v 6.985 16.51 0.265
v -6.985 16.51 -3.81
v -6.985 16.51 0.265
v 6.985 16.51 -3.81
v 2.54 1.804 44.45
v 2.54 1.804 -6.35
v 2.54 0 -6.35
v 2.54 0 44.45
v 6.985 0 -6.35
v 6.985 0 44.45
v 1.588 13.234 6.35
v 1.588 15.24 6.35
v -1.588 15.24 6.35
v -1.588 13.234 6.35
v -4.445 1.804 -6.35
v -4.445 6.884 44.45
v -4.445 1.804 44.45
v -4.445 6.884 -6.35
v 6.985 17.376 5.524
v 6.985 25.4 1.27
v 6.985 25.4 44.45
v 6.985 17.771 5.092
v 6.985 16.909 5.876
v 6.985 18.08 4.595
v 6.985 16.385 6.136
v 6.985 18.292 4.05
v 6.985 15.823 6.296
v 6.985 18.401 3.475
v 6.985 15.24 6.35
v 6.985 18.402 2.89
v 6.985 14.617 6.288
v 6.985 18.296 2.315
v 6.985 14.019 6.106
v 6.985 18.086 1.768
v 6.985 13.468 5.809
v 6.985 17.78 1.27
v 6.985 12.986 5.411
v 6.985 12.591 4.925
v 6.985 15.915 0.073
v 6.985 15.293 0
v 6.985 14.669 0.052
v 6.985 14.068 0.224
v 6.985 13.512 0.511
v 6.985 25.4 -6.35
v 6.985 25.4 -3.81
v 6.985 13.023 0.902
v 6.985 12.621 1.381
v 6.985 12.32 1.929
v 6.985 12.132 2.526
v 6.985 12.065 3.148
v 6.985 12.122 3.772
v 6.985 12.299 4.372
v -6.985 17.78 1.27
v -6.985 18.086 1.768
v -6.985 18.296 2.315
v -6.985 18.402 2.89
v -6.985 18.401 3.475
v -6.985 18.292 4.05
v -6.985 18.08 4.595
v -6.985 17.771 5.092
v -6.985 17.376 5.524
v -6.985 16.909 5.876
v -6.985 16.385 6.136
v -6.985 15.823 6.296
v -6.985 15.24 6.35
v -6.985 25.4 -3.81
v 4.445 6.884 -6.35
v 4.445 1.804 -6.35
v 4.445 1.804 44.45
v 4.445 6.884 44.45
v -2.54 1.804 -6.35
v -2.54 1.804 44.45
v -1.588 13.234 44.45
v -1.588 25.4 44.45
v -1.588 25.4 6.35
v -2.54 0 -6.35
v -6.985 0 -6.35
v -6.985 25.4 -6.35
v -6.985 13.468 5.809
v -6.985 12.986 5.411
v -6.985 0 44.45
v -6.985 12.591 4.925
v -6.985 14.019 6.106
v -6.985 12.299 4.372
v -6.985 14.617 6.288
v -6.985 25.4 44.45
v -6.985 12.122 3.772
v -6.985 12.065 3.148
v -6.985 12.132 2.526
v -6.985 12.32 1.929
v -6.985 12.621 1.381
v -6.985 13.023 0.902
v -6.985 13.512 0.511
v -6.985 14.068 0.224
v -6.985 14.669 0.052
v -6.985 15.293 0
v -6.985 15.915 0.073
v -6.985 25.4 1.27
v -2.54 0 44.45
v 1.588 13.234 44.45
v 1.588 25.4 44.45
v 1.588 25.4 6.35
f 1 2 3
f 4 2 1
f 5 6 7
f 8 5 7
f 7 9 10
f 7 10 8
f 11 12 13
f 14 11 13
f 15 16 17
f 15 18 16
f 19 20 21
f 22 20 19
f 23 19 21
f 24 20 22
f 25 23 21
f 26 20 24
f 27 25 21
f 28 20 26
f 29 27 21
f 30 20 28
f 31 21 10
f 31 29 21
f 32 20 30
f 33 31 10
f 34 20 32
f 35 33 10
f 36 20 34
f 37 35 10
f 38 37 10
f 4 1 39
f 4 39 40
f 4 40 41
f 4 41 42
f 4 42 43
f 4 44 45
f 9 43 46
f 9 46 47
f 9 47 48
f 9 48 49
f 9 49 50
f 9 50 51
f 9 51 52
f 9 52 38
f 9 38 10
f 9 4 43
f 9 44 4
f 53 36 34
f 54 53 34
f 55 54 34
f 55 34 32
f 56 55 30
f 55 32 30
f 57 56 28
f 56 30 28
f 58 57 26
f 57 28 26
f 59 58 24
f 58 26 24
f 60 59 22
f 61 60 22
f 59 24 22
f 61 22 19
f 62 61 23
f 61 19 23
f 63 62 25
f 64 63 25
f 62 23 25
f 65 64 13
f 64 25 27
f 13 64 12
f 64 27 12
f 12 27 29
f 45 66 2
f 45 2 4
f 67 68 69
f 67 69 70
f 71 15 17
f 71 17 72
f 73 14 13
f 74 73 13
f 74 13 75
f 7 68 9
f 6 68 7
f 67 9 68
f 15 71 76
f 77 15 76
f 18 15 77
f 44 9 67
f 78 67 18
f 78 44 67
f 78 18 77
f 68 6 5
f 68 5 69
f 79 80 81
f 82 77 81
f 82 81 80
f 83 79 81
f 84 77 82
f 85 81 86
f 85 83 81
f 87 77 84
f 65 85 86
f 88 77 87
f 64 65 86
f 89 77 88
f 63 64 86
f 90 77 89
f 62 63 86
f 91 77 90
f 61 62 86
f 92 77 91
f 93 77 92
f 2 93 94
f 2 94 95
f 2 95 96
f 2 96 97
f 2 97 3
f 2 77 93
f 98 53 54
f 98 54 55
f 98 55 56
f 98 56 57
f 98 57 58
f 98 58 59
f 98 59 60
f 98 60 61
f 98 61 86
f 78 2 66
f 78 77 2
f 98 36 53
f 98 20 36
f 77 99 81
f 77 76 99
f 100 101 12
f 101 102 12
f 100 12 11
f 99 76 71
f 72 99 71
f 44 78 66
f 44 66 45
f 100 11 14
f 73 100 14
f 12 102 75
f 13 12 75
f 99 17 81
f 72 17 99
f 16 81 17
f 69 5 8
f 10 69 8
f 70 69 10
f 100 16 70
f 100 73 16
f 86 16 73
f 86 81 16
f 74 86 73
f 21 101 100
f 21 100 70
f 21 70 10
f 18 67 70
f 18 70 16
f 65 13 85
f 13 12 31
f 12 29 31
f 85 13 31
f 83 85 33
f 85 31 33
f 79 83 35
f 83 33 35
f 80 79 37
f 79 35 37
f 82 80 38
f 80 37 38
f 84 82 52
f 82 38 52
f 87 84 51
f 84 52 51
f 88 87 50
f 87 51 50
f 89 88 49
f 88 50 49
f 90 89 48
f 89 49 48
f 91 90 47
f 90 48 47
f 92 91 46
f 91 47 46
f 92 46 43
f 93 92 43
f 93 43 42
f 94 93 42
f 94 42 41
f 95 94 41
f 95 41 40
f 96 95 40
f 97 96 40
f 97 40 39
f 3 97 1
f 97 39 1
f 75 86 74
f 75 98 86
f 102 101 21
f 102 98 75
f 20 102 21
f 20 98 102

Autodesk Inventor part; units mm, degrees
ref_plane "YZ Plane" through (0, 0, 0) normal (1, 0, 0) x (0, 1, 0)
ref_plane "XZ Plane" through (0, 0, 0) normal (0, 1, 0) x (-1, 0, 0)
ref_plane "XY Plane" through (0, 0, 0) normal (0, 0, 1) x (1, 0, 0)
sketch "Sketch1" plane through (0, 0, 0) normal (0, 0, 1) x (1, 0, 0)
  line L0 (2.54, -4.344) -> (-2.54, -4.344)
  line L1 (-2.54, -4.344) -> (-2.54, 4.344)
  line L2 (-2.54, 4.344) -> (2.54, 4.344)
  line L3 (2.54, 4.344) -> (2.54, -4.344)
  line L4 (2.54, -4.344) -> (-2.54, 4.344) construction
  line L5 (-2.54, -4.344) -> (2.54, 4.344) construction
  line L6 (4.445, 6.884) -> (-4.445, 6.884)
  line L7 (-4.445, 6.884) -> (-4.445, 1.804)
  line L8 (-4.445, 1.804) -> (4.445, 1.804)
  line L9 (4.445, 1.804) -> (4.445, 6.884)
  line L10 (4.445, 6.884) -> (-4.445, 1.804) construction
  line L11 (-4.445, 6.884) -> (4.445, 1.804) construction
  line L12 (3.8177, 1.5502) -> (-3.8177, 7.1379) construction
  line L13 (-4.445, -1.73) -> (4.445, 10.418) construction
  line L14 (6.985, 0) -> (-6.985, 0)
  line L15 (-6.985, 0) -> (-6.985, 25.4)
  line L16 (-6.985, 25.4) -> (6.985, 25.4)
  line L17 (6.985, 25.4) -> (6.985, 0)
  line L18 (6.985, 0) -> (-6.985, 25.4) construction
  line L19 (-6.985, 0) -> (6.985, 25.4) construction
  line L20 (0, 25.4) -> (0, 0) construction
  line L21 (-1.5875, 25.4) -> (1.5875, 25.4)
  line L22 (1.5875, 25.4) -> (1.5875, 13.234)
  line L23 (1.5875, 13.234) -> (-1.5875, 13.234)
  line L24 (-1.5875, 13.234) -> (-1.5875, 25.4)
  point P0 (0, 4.344)
  point P1 (0, 12.7)
  point P2 (2.54, 1.804)
  point P3 (2.54, 0)
  point P4 (-2.54, 0)
  point P5 (-2.54, 1.804)
  dimension "d0" = 5.08
  dimension "d1" = 8.89
  dimension "d2" = 5.08
  dimension "d3" = 8.89
  dimension "d4" = 8.89
  dimension "d5" = 13.97
  dimension "d6" = 25.4
  dimension "d7" = 0
  dimension "d8" = 3.175
  dimension "d9" = 1.5875
  dimension "d27" = 6.35
extrude "Extrusion1" add sketch "Sketch1" along normal blind 44.45 contours L3 L8 L9 L6 L7 L1 L14 L15 L16 L24 L23 L22 L17
sketch "Sketch2" plane through (0, 0, 0) normal (0, 0, -1) x (-1, 0, 0)
  line L0 (4.445, 6.884) -> (-4.445, 6.884) projected
  line L1 (4.445, 1.804) -> (4.445, 6.884) projected
  line L2 (2.54, 1.804) -> (4.445, 1.804) projected
  line L3 (2.54, 0) -> (2.54, 1.804) projected
  line L4 (6.985, 0) -> (2.54, 0) projected
  line L5 (6.985, 25.4) -> (6.985, 0) projected
  line L6 (1.5875, 25.4) -> (6.985, 25.4) projected
  line L7 (1.5875, 13.234) -> (1.5875, 25.4) projected
  line L8 (-1.5875, 13.234) -> (1.5875, 13.234) projected
  line L9 (-1.5875, 25.4) -> (-1.5875, 13.234) projected
  line L10 (-6.985, 25.4) -> (-1.5875, 25.4) projected
  line L11 (-6.985, 0) -> (-6.985, 25.4) projected
  line L12 (-2.54, 0) -> (-6.985, 0) projected
  line L13 (-2.54, 1.804) -> (-2.54, 0) projected
  line L14 (-4.445, 1.804) -> (-2.54, 1.804) projected
  line L15 (-4.445, 6.884) -> (-4.445, 1.804) projected
  line L16 (-1.5875, 25.4) -> (1.5875, 25.4)
  line L17 (1.5875, 25.4) -> (1.5875, 13.234)
  line L18 (1.5875, 13.234) -> (-1.5875, 13.234)
  line L19 (-1.5875, 13.234) -> (-1.5875, 25.4)
  point P0 (0, 0)
  point P1 (1.5875, 25.4)
extrude "Extrusion2" add sketch "Sketch2" against normal blind 6.35 contours L7 L8 L9 L16
sketch "Sketch3" plane through (6.985, 0, 0) normal (1, 0, 0) x (0, 0, -1)
  line L0 (0, 0) -> (0, 25.4) projected
  line L1 (0, 25.4) -> (-44.45, 25.4) projected
  line L2 (-44.45, 0) -> (-44.45, 25.4) projected
  line L3 (0, 0) -> (-44.45, 0) projected
  line L4 (-6.35, 25.4) -> (-6.35, 13.234) projected
  circle A0 centre (-3.175, 15.24) radius 3.175
  point P0 (0, 0)
  point P1 (0, 12.7)
  dimension "d14" = 6.35
  dimension "d15" = 3.175
  dimension "d16" = 10.16
extrude "Extrusion3" cut sketch "Sketch3" against normal through all contours A0
sketch "Sketch4" plane through (0, 0, 0) normal (0, 0, -1) x (-1, 0, 0)
  line L0 (4.445, 6.884) -> (-4.445, 6.884) projected
  line L1 (4.445, 1.804) -> (4.445, 6.884) projected
  line L2 (2.54, 1.804) -> (4.445, 1.804) projected
  line L3 (2.54, 0) -> (2.54, 1.804) projected
  line L4 (6.985, 0) -> (2.54, 0) projected
  line L5 (6.985, 25.4) -> (6.985, 15.24) projected
  line L6 (-6.985, 25.4) -> (6.985, 25.4) projected
  line L7 (-6.985, 0) -> (-6.985, 15.24) projected
  line L8 (-2.54, 0) -> (-6.985, 0) projected
  line L9 (-2.54, 1.804) -> (-2.54, 0) projected
  line L10 (-4.445, 1.804) -> (-2.54, 1.804) projected
  line L11 (-4.445, 6.884) -> (-4.445, 1.804) projected
  line L12 (-6.985, 0) -> (-6.985, 25.4) projected
  line L13 (-6.985, 12.7) -> (6.985, 12.7)
  line L14 (6.985, 25.4) -> (6.985, 0) projected
  line L15 (-6.985, 15.24) -> (6.985, 15.24) projected
  line L16 (-6.985, 15.24) -> (-6.985, 25.4) projected
  line L17 (6.985, 15.24) -> (6.985, 0) projected
  point P0 (0, 0)
  point P1 (-6.985, 12.7)
  point P2 (6.985, 12.7)
  dimension "d19" = 12.7
extrude "Extrusion4" add sketch "Sketch4" along normal blind 6.35
sketch "Sketch5" plane through (-6.985, 25.4, 44.45) normal (0, 1, 0) x (1, 0, 0)
  line L0 (0, 50.8) -> (0, 0) projected
  line L1 (13.97, 50.8) -> (13.97, 0) projected
  line L2 (0, 50.8) -> (13.97, 50.8)
  line L3 (13.97, 50.8) -> (13.97, 40.64)
  line L4 (13.97, 40.64) -> (0, 40.64)
  line L5 (0, 40.64) -> (0, 50.8)
  line L6 (0, 48.26) -> (13.97, 48.26)
  line L7 (13.97, 48.26) -> (13.97, 43.18)
  line L8 (13.97, 43.18) -> (0, 43.18)
  line L9 (0, 43.18) -> (0, 48.26)
  line L10 (0, 48.26) -> (13.97, 43.18) construction
  line L11 (13.97, 48.26) -> (0, 43.18) construction
  point P0 (6.985, 44.45)
  point P1 (6.985, 45.72)
  point P2 (0, 43.18)
  dimension "d22" = 10.16
  dimension "d23" = 5.08
  dimension "d24" = 5.08
  dimension "d29" = 0
extrude "Extrusion5" cut sketch "Sketch5" against normal blind 8.89 contours L6 L1 L8 L0
fillet "Fillet1" [suppressed]
properties part number "Drone_Launcher_Carriage"
